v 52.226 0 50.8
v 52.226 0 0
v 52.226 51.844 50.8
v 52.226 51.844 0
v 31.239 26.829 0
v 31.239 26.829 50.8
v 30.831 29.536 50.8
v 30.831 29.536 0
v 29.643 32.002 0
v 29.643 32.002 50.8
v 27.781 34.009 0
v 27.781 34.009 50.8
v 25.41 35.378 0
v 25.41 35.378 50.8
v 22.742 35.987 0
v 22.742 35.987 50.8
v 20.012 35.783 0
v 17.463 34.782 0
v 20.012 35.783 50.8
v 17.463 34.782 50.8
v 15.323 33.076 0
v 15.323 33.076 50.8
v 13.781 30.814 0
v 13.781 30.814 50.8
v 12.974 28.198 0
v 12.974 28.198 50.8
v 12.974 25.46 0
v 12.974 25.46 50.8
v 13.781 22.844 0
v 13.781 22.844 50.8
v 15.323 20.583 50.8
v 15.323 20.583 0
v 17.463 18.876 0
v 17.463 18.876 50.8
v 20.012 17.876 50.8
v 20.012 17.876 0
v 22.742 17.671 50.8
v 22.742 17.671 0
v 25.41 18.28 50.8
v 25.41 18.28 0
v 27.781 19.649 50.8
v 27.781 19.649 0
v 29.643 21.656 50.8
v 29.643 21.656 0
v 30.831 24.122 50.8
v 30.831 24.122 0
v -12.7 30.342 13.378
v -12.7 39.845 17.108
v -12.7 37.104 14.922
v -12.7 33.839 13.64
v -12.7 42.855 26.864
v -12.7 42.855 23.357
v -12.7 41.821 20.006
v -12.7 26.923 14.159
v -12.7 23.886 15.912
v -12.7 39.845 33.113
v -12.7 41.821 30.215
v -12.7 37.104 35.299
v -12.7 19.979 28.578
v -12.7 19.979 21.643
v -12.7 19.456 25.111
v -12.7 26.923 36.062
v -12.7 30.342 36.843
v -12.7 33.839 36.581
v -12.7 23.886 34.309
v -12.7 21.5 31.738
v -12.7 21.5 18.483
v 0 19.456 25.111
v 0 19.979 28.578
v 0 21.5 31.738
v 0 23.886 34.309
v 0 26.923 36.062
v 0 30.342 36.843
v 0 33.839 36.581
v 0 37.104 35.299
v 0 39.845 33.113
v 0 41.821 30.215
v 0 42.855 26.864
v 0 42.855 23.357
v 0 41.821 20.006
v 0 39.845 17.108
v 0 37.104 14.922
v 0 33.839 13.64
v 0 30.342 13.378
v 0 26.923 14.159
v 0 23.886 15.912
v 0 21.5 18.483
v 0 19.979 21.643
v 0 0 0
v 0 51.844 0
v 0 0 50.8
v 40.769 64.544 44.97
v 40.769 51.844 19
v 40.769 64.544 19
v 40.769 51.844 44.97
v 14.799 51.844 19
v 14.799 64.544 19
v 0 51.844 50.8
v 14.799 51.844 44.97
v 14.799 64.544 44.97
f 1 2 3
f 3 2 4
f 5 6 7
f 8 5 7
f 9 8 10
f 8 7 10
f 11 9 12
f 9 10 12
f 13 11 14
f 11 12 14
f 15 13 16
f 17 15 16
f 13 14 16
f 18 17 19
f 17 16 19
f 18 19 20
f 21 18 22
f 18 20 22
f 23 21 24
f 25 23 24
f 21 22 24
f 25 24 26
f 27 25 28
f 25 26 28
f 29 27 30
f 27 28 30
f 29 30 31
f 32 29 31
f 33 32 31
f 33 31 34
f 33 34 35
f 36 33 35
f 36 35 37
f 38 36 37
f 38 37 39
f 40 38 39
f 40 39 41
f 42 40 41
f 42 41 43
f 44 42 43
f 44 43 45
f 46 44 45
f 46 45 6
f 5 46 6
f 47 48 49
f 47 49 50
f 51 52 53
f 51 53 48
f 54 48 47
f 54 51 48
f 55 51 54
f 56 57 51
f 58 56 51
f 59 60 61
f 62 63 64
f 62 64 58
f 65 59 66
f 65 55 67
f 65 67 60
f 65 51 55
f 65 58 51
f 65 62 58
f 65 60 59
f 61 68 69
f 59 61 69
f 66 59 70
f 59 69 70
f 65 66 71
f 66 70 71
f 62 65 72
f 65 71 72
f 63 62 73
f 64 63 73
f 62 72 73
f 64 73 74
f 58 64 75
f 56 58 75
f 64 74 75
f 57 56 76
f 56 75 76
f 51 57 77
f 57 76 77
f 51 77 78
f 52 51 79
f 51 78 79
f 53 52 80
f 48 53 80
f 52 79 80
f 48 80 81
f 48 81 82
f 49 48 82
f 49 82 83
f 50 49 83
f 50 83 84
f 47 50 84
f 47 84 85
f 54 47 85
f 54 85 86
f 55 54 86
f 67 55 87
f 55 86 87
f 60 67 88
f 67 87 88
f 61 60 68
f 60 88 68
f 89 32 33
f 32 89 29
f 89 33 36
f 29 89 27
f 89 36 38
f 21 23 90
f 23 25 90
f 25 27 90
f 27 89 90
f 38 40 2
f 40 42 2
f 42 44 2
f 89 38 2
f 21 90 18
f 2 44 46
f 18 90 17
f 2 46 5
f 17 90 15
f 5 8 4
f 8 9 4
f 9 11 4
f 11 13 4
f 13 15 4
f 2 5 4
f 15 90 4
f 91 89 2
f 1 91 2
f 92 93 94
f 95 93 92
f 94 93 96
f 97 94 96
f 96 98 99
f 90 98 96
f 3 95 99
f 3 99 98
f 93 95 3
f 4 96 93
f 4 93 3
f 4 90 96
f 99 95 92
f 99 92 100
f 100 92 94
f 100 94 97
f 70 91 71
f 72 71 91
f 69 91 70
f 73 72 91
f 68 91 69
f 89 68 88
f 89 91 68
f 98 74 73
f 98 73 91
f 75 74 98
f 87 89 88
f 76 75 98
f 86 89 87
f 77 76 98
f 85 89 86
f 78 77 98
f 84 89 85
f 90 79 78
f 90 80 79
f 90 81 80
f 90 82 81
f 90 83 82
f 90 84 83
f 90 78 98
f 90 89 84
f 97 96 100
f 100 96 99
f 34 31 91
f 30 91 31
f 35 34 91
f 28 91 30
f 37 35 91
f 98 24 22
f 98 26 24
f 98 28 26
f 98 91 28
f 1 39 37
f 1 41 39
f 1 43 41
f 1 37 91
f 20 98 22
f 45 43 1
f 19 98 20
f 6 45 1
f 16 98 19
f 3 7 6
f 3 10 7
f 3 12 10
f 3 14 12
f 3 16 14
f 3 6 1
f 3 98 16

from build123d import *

# Parameters (mm, degrees)
F0_W     = 52.226100117
F0_H     = 51.8441870809
F1_DEPTH = 50.8
F2_R     = 9.1837080102
F3_DEPTH = 58.674
F4_W     = 25.969831273
F4_H     = 25.969831273
F5_DEPTH = 12.7
F6_R     = 11.765038499
F7_DEPTH = 12.7


with BuildPart() as f1:
    # F0 (on Top) → F1 (new body)
    with BuildSketch(Plane.XY):
        with Locations((26.1130500585, 25.9220935404)):
            Rectangle(F0_W, F0_H)
    extrude(amount=F1_DEPTH)

    # F2 (on face) → F3 (cut)
    with BuildSketch(Plane.XY.offset(50.8)):
        with Locations((22.0552645624, 26.8291290849)):
            Circle(F2_R)
    extrude(amount=-F3_DEPTH, mode=Mode.SUBTRACT)

    # F4 (on face) → F5 (join)
    with BuildSketch(Plane(origin=(0, 51.8441870809, 0), x_dir=(-1, 0, 0), z_dir=(0, 1, 0))):
        with Locations((-27.7839014307, 31.9849038497)):
            Rectangle(F4_W, F4_H)
    extrude(amount=F5_DEPTH)

    # F6 (on face) → F7 (join)
    with BuildSketch(Plane(origin=(0, 0, 0), x_dir=(0, -1, 0), z_dir=(-1, 0, 0))):
        with Locations((-31.2210861593, 25.1105371863)):
            Circle(F6_R)
    extrude(amount=F7_DEPTH)


solid = f1.part
